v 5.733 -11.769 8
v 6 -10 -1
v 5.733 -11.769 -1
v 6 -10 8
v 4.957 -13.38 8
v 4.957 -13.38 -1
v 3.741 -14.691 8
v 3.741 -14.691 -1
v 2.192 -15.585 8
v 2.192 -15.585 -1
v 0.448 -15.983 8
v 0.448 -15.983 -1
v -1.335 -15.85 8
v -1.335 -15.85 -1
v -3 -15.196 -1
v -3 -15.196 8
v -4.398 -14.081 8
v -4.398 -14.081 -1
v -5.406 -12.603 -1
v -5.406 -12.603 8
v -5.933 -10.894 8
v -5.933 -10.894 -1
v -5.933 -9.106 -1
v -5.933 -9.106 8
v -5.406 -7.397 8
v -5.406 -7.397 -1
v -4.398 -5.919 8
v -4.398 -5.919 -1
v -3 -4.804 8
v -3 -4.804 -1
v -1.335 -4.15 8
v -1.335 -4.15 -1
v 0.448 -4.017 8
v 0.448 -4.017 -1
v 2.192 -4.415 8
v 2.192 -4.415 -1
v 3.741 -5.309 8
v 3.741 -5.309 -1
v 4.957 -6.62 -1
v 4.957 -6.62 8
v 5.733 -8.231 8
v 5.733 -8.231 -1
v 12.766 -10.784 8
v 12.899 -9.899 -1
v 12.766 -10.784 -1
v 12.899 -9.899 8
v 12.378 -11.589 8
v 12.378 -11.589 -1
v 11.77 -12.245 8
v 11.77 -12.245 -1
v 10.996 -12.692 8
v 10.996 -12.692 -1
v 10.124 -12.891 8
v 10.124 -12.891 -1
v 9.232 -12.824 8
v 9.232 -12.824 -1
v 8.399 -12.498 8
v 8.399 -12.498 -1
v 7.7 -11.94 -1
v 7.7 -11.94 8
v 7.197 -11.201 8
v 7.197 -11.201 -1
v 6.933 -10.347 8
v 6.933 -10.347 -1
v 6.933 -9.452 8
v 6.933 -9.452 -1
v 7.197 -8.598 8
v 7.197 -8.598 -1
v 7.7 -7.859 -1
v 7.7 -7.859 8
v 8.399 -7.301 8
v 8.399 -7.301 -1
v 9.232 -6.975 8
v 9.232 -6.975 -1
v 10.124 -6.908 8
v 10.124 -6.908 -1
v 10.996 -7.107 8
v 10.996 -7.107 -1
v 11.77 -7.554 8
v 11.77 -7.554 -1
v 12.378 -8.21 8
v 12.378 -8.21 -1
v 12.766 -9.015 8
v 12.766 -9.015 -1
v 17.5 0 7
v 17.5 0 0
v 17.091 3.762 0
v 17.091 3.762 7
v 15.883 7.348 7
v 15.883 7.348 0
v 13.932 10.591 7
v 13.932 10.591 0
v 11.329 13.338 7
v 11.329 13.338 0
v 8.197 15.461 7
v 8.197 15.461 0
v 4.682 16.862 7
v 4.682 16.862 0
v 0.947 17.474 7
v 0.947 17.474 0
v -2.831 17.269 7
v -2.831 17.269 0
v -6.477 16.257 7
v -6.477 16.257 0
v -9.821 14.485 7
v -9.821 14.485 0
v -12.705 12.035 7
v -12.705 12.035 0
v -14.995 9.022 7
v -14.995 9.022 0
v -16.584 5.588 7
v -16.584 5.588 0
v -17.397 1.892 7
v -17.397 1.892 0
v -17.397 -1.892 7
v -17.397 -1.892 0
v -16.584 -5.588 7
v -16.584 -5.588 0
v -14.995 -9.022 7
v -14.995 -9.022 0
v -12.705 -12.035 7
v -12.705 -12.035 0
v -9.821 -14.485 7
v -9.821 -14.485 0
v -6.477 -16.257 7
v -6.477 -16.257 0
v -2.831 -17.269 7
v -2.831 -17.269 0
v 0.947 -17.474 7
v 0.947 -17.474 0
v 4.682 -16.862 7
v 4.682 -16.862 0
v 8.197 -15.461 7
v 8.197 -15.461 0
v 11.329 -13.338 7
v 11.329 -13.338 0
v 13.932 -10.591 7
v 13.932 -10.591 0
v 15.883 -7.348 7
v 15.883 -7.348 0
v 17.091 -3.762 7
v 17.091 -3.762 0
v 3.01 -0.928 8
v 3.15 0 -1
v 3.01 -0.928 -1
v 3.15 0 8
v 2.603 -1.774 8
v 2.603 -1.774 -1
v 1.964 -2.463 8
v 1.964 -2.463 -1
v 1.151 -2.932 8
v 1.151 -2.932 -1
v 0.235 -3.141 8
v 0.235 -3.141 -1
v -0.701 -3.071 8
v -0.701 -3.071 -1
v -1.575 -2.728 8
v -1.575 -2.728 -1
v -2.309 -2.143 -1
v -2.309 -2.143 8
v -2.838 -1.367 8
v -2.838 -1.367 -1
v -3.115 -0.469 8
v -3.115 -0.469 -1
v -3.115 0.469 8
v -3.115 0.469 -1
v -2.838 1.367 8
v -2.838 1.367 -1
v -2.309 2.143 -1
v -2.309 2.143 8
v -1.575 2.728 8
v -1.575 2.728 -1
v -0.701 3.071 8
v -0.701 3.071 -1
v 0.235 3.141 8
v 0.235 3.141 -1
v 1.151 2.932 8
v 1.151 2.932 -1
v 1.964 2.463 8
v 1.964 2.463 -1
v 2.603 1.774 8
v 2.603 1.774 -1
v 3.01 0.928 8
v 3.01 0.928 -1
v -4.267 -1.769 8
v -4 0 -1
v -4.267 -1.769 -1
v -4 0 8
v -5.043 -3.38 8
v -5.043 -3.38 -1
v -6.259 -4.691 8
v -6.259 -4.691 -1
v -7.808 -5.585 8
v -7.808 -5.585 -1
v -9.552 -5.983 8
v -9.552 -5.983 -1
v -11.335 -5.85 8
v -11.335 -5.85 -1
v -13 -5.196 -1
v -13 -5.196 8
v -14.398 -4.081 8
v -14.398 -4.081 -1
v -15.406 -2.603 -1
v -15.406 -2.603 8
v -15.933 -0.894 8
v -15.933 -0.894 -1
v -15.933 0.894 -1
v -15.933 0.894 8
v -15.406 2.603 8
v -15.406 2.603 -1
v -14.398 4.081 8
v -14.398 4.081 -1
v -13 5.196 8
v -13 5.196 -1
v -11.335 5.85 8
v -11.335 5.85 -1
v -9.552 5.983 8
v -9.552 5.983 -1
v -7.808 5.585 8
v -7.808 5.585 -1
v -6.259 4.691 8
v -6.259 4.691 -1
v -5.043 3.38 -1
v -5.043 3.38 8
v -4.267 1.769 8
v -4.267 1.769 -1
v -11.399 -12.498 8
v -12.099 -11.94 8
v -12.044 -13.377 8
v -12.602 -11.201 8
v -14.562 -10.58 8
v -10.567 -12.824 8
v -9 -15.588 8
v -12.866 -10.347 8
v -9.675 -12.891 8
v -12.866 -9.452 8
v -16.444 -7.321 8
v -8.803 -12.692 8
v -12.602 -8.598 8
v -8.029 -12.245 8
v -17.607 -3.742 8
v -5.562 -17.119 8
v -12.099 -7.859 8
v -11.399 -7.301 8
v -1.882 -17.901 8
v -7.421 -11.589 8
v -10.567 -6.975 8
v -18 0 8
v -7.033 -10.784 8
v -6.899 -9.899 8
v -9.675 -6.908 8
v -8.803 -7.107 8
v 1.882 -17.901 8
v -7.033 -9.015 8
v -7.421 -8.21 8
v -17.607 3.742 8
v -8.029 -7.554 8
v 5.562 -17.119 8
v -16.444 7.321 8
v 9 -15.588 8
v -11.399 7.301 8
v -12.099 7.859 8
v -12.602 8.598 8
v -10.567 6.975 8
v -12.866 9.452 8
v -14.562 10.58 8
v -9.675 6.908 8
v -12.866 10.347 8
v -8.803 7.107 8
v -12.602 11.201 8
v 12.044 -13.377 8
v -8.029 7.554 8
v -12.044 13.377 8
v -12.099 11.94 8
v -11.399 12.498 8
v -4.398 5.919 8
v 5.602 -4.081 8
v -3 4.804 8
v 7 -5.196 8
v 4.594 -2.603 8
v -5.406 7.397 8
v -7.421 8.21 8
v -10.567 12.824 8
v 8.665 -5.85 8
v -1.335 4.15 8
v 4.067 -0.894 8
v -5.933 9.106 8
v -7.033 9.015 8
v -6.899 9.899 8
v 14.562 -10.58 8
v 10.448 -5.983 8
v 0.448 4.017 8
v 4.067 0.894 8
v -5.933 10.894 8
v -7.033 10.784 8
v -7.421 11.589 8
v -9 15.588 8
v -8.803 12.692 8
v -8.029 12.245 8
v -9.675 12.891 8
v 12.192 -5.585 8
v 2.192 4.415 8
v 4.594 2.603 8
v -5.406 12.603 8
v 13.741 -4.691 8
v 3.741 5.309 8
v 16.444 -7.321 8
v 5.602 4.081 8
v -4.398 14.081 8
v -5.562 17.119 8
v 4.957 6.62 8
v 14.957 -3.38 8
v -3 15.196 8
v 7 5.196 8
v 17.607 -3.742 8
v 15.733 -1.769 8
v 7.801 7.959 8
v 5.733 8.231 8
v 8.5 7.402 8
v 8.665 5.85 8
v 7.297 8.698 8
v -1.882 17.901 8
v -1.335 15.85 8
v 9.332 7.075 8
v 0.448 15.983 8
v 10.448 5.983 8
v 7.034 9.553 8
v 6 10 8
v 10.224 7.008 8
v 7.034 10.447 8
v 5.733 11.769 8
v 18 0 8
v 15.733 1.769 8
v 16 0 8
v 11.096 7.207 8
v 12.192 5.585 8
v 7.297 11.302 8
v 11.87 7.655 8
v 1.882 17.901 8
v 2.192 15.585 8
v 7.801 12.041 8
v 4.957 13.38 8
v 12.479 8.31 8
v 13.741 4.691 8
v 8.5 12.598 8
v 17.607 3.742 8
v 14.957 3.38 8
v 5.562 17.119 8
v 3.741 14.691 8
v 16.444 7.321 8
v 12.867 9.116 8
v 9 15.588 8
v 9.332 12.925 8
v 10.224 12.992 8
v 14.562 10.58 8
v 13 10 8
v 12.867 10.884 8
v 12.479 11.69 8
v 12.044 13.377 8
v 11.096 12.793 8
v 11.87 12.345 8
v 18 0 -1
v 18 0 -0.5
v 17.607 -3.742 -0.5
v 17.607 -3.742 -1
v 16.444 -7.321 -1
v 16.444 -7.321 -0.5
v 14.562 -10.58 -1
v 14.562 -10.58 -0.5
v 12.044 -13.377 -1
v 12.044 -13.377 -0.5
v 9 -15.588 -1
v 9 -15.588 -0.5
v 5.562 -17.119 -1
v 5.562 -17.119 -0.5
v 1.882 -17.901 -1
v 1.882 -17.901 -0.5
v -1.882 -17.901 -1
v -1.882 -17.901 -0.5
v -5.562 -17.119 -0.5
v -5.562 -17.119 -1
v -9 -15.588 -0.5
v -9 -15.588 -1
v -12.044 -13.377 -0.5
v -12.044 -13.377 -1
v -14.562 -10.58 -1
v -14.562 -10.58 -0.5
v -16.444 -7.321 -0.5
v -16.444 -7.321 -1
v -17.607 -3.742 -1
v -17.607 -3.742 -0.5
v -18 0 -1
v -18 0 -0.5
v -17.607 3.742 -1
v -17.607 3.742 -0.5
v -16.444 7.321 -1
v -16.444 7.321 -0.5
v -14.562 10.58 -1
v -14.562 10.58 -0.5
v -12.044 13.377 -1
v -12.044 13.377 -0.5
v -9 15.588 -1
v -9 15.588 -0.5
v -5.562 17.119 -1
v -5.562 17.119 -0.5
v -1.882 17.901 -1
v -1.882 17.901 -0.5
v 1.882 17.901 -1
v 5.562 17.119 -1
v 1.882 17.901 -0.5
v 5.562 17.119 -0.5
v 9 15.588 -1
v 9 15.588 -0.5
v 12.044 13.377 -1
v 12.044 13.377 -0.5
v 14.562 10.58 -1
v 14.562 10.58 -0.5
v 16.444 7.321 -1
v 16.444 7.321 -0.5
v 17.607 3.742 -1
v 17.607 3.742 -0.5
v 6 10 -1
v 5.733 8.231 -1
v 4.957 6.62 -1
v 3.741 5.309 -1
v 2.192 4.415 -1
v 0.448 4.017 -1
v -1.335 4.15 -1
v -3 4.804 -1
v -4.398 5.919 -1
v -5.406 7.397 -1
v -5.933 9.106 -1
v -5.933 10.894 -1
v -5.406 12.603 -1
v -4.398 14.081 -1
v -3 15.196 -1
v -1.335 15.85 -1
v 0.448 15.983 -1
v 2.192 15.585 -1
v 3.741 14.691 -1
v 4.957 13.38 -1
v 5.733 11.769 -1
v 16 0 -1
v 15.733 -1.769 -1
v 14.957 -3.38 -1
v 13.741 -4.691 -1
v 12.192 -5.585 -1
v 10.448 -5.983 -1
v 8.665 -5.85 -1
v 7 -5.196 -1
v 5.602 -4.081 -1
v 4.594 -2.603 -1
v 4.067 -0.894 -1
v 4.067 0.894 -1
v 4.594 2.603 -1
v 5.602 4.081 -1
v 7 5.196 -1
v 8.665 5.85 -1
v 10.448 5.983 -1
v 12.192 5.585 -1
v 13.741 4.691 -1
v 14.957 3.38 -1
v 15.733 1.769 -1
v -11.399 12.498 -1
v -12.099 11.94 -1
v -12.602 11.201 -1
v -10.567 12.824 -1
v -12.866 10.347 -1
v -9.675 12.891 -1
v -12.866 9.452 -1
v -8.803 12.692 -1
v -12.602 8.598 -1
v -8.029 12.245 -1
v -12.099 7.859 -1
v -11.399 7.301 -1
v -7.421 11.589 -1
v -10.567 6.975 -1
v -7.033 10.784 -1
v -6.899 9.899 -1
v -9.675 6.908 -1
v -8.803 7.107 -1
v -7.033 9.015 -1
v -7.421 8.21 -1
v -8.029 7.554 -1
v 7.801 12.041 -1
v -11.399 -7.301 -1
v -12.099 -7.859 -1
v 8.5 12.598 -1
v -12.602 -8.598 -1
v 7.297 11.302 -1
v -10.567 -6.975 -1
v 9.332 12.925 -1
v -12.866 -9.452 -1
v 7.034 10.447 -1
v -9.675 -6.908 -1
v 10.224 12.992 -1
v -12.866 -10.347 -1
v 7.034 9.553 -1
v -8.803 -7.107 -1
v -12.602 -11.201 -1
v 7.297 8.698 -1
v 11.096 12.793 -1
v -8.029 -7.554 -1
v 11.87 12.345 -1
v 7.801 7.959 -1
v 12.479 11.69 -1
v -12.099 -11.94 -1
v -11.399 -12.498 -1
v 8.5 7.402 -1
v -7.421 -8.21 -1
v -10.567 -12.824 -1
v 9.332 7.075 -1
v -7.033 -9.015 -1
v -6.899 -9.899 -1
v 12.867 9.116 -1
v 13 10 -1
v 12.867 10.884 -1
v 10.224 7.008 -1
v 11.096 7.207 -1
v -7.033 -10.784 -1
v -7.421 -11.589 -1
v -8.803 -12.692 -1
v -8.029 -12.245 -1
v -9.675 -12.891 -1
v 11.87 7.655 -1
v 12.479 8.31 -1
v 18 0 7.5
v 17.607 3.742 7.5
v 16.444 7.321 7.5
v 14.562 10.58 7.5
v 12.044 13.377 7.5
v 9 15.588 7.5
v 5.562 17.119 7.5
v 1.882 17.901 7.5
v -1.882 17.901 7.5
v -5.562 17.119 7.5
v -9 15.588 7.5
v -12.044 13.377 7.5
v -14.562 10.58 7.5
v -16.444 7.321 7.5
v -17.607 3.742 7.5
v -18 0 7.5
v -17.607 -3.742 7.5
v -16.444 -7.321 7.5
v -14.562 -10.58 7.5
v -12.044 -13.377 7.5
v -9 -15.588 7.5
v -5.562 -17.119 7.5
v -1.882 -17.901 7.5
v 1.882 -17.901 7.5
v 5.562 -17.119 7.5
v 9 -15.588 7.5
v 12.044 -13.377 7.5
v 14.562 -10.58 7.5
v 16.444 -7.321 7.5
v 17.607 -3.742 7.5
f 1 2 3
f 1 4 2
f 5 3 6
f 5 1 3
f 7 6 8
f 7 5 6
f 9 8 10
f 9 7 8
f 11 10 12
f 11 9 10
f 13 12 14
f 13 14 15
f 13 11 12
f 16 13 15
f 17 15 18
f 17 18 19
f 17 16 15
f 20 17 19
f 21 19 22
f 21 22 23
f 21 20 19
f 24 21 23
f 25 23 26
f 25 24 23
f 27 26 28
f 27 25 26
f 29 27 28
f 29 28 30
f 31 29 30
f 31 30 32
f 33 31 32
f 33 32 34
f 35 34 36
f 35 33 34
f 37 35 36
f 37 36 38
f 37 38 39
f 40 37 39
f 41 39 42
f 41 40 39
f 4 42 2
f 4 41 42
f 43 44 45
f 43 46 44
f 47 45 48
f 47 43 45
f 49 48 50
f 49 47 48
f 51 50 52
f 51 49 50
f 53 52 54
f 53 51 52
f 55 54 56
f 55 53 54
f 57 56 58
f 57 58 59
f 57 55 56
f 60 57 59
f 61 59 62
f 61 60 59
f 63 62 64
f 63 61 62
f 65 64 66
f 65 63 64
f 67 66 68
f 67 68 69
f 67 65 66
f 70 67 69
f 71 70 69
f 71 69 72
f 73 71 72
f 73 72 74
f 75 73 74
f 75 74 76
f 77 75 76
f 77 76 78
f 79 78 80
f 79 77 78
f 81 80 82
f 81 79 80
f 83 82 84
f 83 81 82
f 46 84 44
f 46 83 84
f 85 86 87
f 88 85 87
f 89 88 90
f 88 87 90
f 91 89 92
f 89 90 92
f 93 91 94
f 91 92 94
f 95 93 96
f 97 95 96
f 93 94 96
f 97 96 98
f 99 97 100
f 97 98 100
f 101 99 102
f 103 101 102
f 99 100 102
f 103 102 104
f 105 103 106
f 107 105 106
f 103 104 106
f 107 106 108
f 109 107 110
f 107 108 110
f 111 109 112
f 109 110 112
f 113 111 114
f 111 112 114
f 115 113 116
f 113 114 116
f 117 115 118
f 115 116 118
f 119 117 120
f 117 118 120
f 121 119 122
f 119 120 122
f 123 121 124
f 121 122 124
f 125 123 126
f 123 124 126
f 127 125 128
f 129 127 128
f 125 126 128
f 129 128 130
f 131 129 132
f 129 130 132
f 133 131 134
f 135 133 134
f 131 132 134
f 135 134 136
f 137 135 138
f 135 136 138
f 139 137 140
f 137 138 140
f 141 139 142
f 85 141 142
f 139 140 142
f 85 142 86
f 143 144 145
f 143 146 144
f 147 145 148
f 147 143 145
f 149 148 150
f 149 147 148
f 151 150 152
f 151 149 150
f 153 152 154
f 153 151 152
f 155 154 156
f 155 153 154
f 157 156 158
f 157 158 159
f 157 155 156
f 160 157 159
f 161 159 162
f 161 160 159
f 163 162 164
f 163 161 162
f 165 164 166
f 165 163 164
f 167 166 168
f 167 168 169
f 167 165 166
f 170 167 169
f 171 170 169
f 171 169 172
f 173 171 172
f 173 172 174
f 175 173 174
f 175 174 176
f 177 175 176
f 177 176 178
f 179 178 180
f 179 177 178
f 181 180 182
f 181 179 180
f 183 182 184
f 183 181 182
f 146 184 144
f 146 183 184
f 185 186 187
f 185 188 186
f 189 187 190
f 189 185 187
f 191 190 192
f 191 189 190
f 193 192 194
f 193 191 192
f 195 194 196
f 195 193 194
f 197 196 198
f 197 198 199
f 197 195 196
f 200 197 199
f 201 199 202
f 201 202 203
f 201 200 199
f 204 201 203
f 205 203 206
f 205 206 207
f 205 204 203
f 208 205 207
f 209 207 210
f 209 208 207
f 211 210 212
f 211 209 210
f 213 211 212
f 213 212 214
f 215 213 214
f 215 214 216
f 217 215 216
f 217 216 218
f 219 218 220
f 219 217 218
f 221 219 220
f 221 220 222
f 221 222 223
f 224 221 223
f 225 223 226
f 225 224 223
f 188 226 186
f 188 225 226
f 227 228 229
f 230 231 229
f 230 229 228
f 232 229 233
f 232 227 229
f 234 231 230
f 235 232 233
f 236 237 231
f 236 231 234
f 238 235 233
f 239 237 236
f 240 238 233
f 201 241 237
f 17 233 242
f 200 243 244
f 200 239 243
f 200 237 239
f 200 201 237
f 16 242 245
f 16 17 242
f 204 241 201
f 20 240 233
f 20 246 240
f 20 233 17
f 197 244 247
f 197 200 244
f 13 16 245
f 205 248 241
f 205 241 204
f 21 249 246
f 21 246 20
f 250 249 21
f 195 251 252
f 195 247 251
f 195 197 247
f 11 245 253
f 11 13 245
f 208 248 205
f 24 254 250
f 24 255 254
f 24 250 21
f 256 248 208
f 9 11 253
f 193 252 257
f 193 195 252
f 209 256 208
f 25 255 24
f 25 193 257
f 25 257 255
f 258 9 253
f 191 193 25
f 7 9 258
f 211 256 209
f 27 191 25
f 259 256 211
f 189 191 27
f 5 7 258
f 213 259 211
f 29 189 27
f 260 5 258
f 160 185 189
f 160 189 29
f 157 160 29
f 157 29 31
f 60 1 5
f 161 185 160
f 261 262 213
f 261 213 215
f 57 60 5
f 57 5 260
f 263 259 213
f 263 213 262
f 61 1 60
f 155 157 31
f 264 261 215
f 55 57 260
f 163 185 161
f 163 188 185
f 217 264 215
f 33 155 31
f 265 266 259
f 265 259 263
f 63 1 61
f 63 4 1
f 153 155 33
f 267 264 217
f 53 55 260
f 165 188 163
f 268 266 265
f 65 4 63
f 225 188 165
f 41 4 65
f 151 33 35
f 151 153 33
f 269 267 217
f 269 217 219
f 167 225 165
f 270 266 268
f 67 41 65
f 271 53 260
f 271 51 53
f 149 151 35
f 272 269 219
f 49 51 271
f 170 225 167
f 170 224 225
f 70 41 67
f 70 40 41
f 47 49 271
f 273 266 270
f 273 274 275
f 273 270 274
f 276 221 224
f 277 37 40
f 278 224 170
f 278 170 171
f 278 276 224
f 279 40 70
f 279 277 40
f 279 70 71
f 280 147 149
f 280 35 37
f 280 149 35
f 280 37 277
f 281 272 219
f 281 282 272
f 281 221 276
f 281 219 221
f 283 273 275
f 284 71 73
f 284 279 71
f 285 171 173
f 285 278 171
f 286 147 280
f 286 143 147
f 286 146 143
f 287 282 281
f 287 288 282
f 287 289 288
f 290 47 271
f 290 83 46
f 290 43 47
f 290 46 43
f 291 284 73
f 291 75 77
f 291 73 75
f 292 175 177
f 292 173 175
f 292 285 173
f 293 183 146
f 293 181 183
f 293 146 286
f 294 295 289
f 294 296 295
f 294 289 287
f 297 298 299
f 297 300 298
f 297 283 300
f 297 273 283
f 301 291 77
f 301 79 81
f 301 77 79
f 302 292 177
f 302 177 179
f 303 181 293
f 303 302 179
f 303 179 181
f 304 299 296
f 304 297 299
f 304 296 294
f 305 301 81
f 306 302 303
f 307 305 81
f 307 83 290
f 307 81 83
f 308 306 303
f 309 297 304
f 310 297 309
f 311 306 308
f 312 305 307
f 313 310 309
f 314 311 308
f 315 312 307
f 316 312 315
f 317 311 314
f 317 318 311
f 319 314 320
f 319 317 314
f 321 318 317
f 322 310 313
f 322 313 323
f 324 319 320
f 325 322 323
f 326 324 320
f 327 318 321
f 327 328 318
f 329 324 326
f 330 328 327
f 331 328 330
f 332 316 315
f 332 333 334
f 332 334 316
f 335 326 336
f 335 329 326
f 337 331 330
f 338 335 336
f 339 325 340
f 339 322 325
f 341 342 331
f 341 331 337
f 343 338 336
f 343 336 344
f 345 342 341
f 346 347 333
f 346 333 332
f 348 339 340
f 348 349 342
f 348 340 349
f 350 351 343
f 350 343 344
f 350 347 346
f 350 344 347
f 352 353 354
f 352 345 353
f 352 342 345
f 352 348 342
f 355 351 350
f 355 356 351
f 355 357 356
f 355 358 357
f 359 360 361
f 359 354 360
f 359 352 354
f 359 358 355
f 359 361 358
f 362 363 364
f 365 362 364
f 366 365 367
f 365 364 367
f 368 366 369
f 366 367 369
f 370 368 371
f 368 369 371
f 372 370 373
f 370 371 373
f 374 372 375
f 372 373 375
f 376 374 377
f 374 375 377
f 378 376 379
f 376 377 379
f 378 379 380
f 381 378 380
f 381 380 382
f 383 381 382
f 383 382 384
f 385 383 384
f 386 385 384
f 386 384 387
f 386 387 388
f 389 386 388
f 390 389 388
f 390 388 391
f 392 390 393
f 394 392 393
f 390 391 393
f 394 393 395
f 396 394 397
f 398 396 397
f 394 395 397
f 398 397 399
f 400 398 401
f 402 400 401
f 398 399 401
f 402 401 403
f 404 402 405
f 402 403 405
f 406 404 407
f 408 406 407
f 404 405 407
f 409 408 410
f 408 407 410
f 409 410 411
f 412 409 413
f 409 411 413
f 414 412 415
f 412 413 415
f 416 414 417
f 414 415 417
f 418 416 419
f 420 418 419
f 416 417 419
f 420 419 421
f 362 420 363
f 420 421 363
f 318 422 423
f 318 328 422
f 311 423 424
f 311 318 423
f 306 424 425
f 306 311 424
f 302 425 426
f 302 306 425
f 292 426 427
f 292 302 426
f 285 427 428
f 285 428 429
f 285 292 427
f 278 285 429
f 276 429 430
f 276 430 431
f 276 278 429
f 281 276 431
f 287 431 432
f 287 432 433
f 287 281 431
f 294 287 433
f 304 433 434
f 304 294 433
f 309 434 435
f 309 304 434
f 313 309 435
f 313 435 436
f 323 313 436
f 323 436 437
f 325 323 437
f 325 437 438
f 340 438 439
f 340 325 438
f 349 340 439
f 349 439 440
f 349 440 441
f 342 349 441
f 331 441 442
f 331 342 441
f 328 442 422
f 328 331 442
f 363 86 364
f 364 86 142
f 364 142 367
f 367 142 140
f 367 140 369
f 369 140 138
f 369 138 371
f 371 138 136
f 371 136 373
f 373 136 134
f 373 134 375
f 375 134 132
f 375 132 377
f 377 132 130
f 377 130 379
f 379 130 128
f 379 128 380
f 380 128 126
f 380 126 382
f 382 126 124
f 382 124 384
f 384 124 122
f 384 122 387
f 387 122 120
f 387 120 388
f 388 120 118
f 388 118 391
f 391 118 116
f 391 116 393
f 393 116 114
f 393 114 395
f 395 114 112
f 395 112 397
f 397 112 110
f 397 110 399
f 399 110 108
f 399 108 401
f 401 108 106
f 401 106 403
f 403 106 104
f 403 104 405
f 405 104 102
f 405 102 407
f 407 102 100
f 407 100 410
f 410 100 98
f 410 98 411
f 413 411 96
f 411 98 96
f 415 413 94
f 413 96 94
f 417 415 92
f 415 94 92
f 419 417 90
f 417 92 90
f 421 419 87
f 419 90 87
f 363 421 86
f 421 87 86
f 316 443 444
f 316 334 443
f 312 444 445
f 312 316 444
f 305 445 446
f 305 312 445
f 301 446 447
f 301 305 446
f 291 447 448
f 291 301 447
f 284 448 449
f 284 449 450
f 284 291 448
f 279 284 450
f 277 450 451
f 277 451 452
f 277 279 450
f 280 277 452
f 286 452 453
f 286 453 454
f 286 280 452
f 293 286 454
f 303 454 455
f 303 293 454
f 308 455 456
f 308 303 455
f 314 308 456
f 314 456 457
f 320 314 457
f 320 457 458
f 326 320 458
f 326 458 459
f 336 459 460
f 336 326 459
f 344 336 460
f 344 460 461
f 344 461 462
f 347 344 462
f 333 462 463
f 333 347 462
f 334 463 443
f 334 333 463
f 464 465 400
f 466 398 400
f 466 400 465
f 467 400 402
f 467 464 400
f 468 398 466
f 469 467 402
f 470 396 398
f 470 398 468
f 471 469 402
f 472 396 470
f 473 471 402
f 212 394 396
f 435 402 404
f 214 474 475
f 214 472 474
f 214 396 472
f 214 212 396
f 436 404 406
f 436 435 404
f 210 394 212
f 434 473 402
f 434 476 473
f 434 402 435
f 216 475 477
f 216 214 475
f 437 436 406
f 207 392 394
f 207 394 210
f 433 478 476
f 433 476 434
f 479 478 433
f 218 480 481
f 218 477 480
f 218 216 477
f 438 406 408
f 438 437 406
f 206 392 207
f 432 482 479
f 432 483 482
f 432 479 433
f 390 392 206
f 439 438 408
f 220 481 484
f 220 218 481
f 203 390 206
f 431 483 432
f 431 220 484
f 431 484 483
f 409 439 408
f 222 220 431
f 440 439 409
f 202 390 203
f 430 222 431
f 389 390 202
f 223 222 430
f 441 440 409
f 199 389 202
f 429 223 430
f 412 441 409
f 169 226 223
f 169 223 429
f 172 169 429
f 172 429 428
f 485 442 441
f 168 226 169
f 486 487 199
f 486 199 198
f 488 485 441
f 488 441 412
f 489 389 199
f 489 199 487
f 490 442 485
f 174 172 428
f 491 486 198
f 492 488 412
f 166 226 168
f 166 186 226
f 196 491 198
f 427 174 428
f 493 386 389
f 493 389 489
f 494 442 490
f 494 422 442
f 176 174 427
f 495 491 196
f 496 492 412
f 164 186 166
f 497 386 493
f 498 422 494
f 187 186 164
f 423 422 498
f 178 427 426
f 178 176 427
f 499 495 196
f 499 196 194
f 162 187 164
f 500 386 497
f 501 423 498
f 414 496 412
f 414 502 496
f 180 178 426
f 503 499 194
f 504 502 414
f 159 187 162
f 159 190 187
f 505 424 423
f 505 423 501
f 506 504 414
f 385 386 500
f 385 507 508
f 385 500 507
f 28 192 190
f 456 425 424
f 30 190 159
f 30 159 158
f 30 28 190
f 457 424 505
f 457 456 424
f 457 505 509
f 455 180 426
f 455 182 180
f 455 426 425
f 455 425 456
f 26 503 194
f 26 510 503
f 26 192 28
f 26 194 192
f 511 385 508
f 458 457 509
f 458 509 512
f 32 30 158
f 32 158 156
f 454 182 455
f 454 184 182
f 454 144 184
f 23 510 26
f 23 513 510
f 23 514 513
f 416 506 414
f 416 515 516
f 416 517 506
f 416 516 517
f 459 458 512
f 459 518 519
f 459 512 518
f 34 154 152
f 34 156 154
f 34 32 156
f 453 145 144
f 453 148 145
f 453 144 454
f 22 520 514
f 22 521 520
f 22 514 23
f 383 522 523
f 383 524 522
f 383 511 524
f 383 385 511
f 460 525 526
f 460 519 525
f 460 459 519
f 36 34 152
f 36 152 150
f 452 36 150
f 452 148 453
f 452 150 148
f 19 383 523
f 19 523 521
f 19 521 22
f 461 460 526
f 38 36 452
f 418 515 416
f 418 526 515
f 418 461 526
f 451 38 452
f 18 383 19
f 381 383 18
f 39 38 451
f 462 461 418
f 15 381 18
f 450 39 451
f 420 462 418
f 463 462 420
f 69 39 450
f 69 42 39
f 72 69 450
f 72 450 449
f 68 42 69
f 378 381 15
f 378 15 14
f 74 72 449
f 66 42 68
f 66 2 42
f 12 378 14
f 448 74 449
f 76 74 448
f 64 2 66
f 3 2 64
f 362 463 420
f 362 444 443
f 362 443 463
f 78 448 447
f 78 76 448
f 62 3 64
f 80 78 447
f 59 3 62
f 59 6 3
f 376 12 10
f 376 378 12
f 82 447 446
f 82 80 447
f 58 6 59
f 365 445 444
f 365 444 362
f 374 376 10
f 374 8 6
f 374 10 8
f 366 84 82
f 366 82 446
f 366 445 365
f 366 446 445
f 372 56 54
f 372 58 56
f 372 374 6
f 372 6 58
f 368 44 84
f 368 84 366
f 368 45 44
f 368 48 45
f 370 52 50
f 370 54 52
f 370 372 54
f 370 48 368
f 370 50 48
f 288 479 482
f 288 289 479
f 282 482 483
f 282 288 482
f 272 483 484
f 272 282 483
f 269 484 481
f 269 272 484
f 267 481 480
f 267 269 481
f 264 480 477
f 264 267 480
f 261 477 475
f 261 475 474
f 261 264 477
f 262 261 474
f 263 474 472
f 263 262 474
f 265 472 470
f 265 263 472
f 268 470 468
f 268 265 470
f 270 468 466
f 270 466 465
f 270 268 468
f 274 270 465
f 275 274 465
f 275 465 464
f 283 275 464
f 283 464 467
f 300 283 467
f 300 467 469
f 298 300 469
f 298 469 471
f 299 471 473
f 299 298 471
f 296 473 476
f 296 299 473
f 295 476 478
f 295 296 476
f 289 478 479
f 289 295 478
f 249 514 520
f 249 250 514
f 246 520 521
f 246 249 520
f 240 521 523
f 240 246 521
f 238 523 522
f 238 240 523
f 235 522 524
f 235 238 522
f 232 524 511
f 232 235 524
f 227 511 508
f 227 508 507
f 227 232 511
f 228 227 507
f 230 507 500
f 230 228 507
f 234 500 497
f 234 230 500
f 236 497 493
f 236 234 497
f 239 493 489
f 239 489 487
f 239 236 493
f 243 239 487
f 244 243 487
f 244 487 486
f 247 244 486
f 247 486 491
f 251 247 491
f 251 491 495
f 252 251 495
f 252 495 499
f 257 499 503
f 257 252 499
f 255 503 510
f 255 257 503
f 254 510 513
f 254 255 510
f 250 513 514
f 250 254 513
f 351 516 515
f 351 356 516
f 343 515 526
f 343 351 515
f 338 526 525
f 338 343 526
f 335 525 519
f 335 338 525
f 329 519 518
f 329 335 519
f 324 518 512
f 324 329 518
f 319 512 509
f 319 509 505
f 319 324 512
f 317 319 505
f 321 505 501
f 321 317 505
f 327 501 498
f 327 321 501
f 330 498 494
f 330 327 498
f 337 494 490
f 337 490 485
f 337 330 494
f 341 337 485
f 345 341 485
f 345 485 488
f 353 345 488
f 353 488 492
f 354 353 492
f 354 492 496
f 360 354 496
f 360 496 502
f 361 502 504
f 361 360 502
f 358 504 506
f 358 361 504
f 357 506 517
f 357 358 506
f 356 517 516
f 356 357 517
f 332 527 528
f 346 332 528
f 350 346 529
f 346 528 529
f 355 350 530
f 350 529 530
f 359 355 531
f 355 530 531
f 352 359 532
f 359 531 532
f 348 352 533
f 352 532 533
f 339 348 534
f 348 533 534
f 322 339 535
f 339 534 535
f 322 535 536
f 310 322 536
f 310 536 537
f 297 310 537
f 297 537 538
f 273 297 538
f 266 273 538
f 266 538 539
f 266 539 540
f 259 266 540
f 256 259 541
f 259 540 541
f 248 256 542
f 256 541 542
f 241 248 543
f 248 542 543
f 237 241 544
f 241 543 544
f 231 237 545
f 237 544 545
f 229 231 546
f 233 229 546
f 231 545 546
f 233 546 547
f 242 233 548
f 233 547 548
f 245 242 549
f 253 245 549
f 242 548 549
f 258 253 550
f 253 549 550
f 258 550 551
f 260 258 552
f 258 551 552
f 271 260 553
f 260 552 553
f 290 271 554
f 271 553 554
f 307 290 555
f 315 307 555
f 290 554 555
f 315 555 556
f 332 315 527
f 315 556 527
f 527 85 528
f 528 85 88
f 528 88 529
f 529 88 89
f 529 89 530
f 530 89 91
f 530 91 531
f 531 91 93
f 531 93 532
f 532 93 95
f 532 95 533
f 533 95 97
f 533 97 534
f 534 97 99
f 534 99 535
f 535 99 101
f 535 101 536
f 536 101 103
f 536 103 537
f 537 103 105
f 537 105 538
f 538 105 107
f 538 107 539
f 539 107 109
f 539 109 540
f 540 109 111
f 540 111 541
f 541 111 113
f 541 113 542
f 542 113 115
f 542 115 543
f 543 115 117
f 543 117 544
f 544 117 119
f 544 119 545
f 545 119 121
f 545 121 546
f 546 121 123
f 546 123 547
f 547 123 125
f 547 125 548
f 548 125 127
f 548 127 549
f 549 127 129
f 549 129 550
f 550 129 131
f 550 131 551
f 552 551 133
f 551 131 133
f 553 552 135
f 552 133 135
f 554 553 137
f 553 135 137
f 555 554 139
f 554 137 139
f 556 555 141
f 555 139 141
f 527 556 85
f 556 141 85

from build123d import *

# Parameters (mm, degrees)
F0_R     = 17.5
F0_R_2   = 3
F0_R_3   = 6
F0_R_4   = 3.15
F1_DEPTH = 7
F2_R     = 18
F2_R_2   = 17.5
F2_R_3   = 3
F2_R_4   = 6
F2_R_5   = 3.15
F3_DEPTH = 1
F4_R     = 18
F4_R_2   = 17.5
F4_R_3   = 3
F4_R_4   = 6
F4_R_5   = 3.15
F5_DEPTH = 1
F6_SIZE  = 0.49999


# Not quite as in the source:
# - a fillet or chamfer is up to 0.001 mm smaller than in the source, because OpenCascade refuses the exact size


with BuildPart() as f1:
    # F0 (on Top) → F1 (new body)
    with BuildSketch(Plane.XY):
        Circle(F0_R)
        with Locations((-9.8994949366, -9.8994949366)):
            Circle(F0_R_2, mode=Mode.SUBTRACT)
        with Locations((0, -10)):
            Circle(F0_R_3, mode=Mode.SUBTRACT)
        with Locations((9.8994949366, -9.8994949366)):
            Circle(F0_R_2, mode=Mode.SUBTRACT)
        with Locations((-10, 0)):
            Circle(F0_R_3, mode=Mode.SUBTRACT)
        with Locations((-9.8994949366, 9.8994949366)):
            Circle(F0_R_2, mode=Mode.SUBTRACT)
        Circle(F0_R_4, mode=Mode.SUBTRACT)
        with Locations((10, 0)):
            Circle(F0_R_3, mode=Mode.SUBTRACT)
        with Locations((0, 10)):
            Circle(F0_R_3, mode=Mode.SUBTRACT)
        with Locations((10, 10)):
            Circle(F0_R_2, mode=Mode.SUBTRACT)
    extrude(amount=F1_DEPTH)

    # F2 (on face) → F3 (join)
    with BuildSketch(Plane.XY.offset(7)):
        Circle(F2_R)
        Circle(F2_R_2, mode=Mode.SUBTRACT)
        Circle(F2_R_2)
        with Locations((-9.8994949366, -9.8994949366)):
            Circle(F2_R_3, mode=Mode.SUBTRACT)
        with Locations((0, -10)):
            Circle(F2_R_4, mode=Mode.SUBTRACT)
        with Locations((9.8994949366, -9.8994949366)):
            Circle(F2_R_3, mode=Mode.SUBTRACT)
        with Locations((-10, 0)):
            Circle(F2_R_4, mode=Mode.SUBTRACT)
        with Locations((-9.8994949366, 9.8994949366)):
            Circle(F2_R_3, mode=Mode.SUBTRACT)
        Circle(F2_R_5, mode=Mode.SUBTRACT)
        with Locations((10, 0)):
            Circle(F2_R_4, mode=Mode.SUBTRACT)
        with Locations((0, 10)):
            Circle(F2_R_4, mode=Mode.SUBTRACT)
        with Locations((10, 10)):
            Circle(F2_R_3, mode=Mode.SUBTRACT)
    extrude(amount=F3_DEPTH)

    # F4 (on face) → F5 (join)
    with BuildSketch(Plane(origin=(0, 0, 0), x_dir=(1, 0, 0), z_dir=(0, 0, -1))):
        Circle(F4_R)
        Circle(F4_R_2, mode=Mode.SUBTRACT)
        Circle(F4_R_2)
        with Locations((-9.8994949366, -9.8994949366)):
            Circle(F4_R_3, mode=Mode.SUBTRACT)
        with Locations((0, -10)):
            Circle(F4_R_4, mode=Mode.SUBTRACT)
        with Locations((10, -10)):
            Circle(F4_R_3, mode=Mode.SUBTRACT)
        with Locations((-10, 0)):
            Circle(F4_R_4, mode=Mode.SUBTRACT)
        with Locations((-9.8994949366, 9.8994949366)):
            Circle(F4_R_3, mode=Mode.SUBTRACT)
        Circle(F4_R_5, mode=Mode.SUBTRACT)
        with Locations((10, 0)):
            Circle(F4_R_4, mode=Mode.SUBTRACT)
        with Locations((0, 10)):
            Circle(F4_R_4, mode=Mode.SUBTRACT)
        with Locations((9.8994949366, 9.8994949366)):
            Circle(F4_R_3, mode=Mode.SUBTRACT)
    extrude(amount=F5_DEPTH)

    # F6 (size 0.5 in the source; OpenCascade refuses exactly that, so slightly less here)
    f6_edges = [f1.edges().sort_by_distance(p)[0] for p in [
        (-18, 0, 0),
        (-18, 0, 7),
    ]]
    chamfer(f6_edges, length=F6_SIZE)


solid = f1.part
